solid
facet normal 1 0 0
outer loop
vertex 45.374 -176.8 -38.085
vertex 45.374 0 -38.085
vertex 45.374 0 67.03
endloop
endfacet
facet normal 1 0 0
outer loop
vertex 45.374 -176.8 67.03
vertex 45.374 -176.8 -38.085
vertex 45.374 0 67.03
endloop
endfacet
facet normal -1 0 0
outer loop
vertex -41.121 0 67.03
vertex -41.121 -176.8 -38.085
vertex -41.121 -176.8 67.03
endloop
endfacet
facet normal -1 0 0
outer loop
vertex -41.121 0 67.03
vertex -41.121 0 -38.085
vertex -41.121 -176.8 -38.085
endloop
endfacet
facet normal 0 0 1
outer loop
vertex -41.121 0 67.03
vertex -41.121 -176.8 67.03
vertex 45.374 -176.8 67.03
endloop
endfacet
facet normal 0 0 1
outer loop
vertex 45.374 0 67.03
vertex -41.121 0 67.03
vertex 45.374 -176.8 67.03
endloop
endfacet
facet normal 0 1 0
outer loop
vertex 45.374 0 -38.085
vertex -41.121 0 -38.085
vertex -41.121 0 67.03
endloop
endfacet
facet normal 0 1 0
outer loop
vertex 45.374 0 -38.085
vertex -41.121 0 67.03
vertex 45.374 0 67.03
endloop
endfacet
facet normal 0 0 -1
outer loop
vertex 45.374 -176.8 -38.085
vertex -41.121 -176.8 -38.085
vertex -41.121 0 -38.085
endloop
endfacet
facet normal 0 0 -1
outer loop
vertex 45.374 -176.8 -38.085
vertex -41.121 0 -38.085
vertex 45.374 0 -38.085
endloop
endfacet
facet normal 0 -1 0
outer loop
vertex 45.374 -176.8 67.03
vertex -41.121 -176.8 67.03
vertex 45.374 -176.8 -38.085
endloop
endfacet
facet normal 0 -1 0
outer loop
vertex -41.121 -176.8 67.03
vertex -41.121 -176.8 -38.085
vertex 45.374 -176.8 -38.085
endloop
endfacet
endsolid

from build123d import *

# Parameters (mm, degrees)
F0_W     = 86.4951871336
F0_H     = 80.115608871
F1_DEPTH = 95.8
F2_DEPTH = 25
F3_DEPTH = 81


with BuildPart() as f1:
    # F0 (on Front) → F1 (new body)
    with BuildSketch(Plane.XZ):
        with Locations((2.1268483251, 1.9725449383)):
            Rectangle(F0_W, F0_H)
    extrude(amount=F1_DEPTH)

    # F2 (add): a face of the model
    f2_faces = [f1.faces().sort_by_distance(p)[0] for p in [
        (2.1268483251, -47.9, 42.0303493738),
    ]]
    extrude(f2_faces, amount=F2_DEPTH)

    # F3 (add): a face of the model
    f3_faces = [f1.faces().sort_by_distance(p)[0] for p in [
        (2.1268483251, -95.8, 14.4725449383),
    ]]
    extrude(f3_faces, amount=F3_DEPTH)


solid = f1.part
